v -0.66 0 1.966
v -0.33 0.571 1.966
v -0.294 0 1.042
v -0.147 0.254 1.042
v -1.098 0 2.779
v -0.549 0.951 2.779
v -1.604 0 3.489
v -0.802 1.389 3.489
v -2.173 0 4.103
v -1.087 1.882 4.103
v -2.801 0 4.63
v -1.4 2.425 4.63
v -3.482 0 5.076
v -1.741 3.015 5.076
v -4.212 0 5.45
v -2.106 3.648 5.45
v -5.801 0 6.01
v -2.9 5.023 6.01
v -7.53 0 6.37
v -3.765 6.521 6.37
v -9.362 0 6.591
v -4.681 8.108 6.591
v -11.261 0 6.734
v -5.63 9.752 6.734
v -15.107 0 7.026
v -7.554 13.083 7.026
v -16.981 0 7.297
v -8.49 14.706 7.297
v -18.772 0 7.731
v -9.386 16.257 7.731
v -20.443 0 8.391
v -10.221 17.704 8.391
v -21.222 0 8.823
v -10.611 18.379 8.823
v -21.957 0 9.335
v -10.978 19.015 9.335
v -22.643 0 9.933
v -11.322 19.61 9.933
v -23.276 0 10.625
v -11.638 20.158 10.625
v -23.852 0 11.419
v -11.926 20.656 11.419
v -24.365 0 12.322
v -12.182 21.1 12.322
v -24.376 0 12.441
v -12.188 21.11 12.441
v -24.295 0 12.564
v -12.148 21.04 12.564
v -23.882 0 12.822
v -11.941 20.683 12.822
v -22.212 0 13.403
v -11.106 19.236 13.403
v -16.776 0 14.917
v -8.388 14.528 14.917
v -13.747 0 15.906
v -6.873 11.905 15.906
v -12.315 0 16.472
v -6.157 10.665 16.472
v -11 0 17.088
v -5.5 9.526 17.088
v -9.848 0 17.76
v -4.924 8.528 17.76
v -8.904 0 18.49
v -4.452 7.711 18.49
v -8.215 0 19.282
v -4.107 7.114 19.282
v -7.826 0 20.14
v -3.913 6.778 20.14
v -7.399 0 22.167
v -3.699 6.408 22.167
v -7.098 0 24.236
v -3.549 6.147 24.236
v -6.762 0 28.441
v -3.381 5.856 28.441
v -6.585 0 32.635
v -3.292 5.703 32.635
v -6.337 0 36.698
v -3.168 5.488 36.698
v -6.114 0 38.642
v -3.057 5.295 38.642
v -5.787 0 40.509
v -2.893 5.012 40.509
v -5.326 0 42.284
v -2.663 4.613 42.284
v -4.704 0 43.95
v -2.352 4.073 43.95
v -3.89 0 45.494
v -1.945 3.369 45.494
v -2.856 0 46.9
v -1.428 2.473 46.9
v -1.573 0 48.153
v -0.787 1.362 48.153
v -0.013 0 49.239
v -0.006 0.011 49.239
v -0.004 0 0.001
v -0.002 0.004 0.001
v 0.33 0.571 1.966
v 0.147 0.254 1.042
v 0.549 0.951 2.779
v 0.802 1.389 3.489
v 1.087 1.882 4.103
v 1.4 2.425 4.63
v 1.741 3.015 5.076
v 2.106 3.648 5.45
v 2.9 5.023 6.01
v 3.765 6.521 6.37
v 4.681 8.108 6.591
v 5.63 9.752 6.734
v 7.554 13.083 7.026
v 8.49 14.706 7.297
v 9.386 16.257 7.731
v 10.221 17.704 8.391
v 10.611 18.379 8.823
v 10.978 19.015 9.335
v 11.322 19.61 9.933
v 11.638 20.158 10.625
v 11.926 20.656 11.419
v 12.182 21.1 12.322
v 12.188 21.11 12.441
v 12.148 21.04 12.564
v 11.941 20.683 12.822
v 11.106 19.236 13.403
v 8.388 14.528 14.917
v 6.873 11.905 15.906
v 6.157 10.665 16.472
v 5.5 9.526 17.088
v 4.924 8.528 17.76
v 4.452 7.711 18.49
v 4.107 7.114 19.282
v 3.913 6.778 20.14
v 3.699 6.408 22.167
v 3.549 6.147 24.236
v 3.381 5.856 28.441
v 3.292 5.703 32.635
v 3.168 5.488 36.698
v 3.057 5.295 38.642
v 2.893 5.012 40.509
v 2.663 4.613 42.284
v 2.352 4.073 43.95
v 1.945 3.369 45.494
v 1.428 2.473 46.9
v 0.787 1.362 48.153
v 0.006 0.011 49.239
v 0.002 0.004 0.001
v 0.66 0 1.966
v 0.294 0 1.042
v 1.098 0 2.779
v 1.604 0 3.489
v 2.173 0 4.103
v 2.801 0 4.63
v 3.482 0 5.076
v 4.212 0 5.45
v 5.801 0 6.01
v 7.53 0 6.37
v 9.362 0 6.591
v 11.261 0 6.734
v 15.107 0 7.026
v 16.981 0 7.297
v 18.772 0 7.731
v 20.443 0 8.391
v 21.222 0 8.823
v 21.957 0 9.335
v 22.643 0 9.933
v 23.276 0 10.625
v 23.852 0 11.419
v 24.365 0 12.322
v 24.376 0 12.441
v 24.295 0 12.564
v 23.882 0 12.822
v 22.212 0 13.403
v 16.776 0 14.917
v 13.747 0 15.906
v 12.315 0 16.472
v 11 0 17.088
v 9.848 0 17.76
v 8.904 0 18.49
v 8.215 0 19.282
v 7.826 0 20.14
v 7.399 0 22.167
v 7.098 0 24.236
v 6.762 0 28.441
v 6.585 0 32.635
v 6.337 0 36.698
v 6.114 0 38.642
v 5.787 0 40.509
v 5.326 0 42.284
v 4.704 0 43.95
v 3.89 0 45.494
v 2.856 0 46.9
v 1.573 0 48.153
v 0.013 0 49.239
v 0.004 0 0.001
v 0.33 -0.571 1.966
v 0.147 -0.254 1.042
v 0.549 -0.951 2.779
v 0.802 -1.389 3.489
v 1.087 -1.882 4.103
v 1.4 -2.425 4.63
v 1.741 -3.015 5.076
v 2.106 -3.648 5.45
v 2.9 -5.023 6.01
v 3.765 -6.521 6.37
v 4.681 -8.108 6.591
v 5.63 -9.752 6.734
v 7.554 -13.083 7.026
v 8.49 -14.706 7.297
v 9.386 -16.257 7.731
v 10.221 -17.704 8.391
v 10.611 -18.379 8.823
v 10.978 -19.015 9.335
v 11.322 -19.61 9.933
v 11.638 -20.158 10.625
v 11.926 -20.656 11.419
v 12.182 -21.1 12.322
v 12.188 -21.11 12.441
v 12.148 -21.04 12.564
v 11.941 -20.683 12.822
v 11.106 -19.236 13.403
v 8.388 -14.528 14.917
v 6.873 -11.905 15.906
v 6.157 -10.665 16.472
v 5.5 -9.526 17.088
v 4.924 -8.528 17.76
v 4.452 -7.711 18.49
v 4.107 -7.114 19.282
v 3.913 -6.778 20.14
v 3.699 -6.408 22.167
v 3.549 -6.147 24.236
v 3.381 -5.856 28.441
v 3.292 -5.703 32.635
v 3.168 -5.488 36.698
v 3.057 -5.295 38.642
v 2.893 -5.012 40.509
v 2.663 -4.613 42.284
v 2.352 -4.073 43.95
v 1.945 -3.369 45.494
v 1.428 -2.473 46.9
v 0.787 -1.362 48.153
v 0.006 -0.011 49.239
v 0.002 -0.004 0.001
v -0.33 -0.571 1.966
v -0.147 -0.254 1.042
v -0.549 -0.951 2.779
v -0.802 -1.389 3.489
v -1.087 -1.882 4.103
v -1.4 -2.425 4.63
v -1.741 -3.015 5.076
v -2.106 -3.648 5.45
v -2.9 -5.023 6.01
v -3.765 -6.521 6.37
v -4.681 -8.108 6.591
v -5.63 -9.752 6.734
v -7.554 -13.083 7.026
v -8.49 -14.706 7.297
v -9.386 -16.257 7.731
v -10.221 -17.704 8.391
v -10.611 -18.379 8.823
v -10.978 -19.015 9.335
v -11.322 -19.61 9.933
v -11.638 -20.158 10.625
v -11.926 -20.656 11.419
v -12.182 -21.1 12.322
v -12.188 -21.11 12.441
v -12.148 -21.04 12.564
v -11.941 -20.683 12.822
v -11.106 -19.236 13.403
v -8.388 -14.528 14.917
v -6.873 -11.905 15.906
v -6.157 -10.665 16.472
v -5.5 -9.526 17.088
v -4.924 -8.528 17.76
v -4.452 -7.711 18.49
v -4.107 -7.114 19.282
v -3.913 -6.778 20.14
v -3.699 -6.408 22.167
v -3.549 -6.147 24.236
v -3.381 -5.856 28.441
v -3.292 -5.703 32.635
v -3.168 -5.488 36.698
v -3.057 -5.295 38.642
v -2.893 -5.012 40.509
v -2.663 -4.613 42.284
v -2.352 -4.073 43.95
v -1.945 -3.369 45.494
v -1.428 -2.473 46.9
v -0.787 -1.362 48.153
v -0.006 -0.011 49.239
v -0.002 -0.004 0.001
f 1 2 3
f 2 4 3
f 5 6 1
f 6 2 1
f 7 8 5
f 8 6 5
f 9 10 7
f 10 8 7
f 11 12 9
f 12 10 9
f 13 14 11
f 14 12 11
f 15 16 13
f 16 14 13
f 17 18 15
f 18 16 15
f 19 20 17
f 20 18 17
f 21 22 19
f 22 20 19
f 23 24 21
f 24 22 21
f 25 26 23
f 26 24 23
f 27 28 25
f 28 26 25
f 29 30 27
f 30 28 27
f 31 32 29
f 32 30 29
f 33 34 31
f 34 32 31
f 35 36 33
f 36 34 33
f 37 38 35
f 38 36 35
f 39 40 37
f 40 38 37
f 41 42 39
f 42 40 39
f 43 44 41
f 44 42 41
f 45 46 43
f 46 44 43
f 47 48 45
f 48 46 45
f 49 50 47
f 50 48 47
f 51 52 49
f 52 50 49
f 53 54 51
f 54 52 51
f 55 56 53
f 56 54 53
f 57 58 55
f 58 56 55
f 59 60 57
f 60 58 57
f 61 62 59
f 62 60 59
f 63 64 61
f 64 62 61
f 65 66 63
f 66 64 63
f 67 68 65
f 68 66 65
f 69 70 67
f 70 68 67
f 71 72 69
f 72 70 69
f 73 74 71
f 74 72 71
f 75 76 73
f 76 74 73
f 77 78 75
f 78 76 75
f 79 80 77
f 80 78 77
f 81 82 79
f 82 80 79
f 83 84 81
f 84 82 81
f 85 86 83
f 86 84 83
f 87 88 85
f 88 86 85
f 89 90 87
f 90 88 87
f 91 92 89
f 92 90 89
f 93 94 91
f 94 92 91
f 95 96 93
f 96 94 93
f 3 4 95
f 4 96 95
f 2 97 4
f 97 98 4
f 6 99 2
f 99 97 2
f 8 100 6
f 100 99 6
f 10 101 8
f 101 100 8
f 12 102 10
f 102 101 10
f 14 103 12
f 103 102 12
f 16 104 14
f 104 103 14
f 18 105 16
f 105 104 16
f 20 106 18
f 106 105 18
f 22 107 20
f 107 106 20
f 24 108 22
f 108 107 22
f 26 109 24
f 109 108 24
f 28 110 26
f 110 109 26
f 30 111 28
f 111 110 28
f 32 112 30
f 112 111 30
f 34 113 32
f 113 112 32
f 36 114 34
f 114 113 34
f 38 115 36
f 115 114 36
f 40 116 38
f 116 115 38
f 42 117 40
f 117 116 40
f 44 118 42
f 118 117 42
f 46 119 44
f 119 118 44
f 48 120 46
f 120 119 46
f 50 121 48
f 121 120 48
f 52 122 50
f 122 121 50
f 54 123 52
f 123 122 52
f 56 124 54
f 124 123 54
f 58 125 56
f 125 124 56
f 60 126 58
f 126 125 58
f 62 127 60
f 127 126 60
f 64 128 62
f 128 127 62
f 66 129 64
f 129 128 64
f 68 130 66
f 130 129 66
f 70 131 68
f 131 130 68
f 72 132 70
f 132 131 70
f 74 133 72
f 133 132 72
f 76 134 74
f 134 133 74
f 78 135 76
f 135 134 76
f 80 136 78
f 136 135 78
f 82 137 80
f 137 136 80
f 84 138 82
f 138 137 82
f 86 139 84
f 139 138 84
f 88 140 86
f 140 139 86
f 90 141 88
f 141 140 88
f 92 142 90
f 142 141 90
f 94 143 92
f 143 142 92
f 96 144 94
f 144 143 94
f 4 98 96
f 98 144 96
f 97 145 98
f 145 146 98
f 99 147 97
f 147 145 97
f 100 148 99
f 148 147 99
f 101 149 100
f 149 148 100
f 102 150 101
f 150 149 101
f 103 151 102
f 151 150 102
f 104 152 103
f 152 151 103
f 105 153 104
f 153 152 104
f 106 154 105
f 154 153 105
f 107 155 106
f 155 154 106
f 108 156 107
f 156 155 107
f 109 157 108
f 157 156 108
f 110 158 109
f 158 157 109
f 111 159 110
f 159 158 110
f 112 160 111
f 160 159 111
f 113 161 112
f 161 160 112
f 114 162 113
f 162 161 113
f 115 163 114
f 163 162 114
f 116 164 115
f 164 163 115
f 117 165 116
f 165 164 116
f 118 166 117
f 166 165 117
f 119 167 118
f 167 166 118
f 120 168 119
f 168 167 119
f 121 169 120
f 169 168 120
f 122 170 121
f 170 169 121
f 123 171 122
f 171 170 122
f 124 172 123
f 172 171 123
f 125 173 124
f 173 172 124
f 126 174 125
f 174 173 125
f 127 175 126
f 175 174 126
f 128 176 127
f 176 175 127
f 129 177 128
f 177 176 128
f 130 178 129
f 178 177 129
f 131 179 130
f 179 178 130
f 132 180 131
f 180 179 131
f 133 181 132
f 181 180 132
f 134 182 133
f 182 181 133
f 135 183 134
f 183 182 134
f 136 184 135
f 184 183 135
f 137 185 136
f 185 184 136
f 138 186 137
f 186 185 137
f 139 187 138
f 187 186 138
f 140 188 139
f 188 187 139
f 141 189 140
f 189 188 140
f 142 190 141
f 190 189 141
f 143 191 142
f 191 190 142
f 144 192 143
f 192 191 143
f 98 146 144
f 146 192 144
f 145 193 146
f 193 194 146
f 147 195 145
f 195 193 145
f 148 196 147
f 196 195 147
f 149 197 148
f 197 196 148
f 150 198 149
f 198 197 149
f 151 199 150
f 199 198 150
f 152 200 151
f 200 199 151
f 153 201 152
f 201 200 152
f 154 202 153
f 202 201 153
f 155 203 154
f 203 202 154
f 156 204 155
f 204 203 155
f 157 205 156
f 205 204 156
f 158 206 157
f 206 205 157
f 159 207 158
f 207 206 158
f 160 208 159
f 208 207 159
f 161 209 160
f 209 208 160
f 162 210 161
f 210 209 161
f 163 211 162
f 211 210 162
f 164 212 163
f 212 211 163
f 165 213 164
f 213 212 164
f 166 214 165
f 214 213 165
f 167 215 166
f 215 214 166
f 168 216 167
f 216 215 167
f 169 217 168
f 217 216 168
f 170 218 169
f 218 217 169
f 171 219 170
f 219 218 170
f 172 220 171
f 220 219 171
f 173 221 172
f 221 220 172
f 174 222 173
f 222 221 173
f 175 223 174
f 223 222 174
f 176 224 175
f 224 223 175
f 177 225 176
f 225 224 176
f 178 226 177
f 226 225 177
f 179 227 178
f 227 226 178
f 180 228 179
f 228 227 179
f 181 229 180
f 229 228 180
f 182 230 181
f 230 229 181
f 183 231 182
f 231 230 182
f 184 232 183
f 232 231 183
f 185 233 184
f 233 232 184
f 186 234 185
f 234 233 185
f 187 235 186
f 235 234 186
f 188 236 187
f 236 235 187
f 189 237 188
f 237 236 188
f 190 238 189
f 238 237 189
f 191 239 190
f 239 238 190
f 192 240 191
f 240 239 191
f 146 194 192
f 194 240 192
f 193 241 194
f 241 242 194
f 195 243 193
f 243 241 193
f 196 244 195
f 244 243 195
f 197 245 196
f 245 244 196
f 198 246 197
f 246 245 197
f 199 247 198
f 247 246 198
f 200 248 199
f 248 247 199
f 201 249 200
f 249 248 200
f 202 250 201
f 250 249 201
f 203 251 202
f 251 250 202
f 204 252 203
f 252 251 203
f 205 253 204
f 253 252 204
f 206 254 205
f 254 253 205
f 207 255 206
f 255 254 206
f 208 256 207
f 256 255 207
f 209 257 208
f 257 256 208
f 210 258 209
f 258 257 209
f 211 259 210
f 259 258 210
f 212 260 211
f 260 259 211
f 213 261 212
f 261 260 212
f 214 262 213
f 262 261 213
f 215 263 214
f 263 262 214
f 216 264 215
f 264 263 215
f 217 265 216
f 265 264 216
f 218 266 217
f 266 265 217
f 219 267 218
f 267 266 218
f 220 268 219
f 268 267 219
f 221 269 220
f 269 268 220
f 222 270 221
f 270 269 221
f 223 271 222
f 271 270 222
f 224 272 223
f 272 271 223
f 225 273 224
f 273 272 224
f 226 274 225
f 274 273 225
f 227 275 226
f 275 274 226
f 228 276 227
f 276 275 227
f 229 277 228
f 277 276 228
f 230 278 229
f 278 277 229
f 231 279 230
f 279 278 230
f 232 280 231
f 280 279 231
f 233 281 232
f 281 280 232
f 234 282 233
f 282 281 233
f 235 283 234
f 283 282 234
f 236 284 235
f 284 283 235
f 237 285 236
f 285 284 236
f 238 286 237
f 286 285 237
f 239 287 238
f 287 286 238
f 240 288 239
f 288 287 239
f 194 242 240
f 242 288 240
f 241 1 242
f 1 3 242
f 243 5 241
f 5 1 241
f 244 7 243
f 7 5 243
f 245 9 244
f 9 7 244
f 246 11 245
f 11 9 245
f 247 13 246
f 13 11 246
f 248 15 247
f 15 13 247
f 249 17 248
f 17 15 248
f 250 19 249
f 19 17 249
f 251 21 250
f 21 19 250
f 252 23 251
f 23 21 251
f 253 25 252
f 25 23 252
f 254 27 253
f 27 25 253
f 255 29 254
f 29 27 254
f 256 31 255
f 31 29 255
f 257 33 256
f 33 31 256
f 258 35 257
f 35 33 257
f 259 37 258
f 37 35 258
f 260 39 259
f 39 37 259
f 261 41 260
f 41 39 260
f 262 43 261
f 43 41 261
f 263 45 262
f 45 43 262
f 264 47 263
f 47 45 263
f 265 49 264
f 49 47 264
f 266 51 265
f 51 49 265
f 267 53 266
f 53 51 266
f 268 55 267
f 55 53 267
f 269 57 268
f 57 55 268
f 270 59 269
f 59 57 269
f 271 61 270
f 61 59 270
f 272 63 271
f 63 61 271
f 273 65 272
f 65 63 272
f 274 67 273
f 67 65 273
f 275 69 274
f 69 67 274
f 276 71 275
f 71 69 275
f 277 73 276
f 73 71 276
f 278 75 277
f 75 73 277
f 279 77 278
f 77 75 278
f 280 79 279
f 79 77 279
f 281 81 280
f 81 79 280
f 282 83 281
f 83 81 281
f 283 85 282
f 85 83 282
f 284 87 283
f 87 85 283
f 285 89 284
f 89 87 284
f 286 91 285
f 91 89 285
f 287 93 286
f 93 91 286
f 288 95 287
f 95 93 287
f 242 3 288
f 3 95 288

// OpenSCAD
$fn=6;
rotate_extrude(angle=360)
translate ([12.19,24.62,0])
scale([25.4/90, -25.4/90, 1]) union()

    polygon([[-43.177271,87.233475],[-42.152691,83.542795],[-40.855480,80.270689],[-39.302111,77.390307],[-37.509053,74.874800],[-35.492777,72.697322],[-33.269755,70.831022],[-30.856456,69.249053],[-28.269353,67.924566],[-22.639615,65.940643],[-16.512307,64.664467],[-10.019196,63.881248],[-3.292049,63.376200],[10.337285,62.341461],[16.975939,61.382195],[23.321561,59.841947],[29.242385,57.505929],[32.002320,55.972385],[34.606643,54.159353],[37.038883,52.039984],[39.282569,49.587431],[41.321231,46.774844],[43.138397,43.575375],[43.177271,43.153692],[42.891855,42.718836],[41.429607,41.803418],[35.509627,39.746430],[16.249172,34.381249],[5.515235,30.875002],[0.442519,28.872641],[-4.216817,26.687616],[-8.299864,24.307549],[-11.643713,21.720063],[-14.085457,18.912777],[-15.462186,15.873315],[-16.976108,8.691132],[-18.041238,1.359477],[-19.234541,-13.539790],[-19.860925,-28.399559],[-20.739225,-42.794903],[-21.528727,-49.685625],[-22.688270,-56.300893],[-24.320207,-62.587591],[-26.526893,-68.492603],[-29.410681,-73.962814],[-33.073926,-78.945107],[-37.618982,-83.386366],[-43.148201,-87.233475]]);
